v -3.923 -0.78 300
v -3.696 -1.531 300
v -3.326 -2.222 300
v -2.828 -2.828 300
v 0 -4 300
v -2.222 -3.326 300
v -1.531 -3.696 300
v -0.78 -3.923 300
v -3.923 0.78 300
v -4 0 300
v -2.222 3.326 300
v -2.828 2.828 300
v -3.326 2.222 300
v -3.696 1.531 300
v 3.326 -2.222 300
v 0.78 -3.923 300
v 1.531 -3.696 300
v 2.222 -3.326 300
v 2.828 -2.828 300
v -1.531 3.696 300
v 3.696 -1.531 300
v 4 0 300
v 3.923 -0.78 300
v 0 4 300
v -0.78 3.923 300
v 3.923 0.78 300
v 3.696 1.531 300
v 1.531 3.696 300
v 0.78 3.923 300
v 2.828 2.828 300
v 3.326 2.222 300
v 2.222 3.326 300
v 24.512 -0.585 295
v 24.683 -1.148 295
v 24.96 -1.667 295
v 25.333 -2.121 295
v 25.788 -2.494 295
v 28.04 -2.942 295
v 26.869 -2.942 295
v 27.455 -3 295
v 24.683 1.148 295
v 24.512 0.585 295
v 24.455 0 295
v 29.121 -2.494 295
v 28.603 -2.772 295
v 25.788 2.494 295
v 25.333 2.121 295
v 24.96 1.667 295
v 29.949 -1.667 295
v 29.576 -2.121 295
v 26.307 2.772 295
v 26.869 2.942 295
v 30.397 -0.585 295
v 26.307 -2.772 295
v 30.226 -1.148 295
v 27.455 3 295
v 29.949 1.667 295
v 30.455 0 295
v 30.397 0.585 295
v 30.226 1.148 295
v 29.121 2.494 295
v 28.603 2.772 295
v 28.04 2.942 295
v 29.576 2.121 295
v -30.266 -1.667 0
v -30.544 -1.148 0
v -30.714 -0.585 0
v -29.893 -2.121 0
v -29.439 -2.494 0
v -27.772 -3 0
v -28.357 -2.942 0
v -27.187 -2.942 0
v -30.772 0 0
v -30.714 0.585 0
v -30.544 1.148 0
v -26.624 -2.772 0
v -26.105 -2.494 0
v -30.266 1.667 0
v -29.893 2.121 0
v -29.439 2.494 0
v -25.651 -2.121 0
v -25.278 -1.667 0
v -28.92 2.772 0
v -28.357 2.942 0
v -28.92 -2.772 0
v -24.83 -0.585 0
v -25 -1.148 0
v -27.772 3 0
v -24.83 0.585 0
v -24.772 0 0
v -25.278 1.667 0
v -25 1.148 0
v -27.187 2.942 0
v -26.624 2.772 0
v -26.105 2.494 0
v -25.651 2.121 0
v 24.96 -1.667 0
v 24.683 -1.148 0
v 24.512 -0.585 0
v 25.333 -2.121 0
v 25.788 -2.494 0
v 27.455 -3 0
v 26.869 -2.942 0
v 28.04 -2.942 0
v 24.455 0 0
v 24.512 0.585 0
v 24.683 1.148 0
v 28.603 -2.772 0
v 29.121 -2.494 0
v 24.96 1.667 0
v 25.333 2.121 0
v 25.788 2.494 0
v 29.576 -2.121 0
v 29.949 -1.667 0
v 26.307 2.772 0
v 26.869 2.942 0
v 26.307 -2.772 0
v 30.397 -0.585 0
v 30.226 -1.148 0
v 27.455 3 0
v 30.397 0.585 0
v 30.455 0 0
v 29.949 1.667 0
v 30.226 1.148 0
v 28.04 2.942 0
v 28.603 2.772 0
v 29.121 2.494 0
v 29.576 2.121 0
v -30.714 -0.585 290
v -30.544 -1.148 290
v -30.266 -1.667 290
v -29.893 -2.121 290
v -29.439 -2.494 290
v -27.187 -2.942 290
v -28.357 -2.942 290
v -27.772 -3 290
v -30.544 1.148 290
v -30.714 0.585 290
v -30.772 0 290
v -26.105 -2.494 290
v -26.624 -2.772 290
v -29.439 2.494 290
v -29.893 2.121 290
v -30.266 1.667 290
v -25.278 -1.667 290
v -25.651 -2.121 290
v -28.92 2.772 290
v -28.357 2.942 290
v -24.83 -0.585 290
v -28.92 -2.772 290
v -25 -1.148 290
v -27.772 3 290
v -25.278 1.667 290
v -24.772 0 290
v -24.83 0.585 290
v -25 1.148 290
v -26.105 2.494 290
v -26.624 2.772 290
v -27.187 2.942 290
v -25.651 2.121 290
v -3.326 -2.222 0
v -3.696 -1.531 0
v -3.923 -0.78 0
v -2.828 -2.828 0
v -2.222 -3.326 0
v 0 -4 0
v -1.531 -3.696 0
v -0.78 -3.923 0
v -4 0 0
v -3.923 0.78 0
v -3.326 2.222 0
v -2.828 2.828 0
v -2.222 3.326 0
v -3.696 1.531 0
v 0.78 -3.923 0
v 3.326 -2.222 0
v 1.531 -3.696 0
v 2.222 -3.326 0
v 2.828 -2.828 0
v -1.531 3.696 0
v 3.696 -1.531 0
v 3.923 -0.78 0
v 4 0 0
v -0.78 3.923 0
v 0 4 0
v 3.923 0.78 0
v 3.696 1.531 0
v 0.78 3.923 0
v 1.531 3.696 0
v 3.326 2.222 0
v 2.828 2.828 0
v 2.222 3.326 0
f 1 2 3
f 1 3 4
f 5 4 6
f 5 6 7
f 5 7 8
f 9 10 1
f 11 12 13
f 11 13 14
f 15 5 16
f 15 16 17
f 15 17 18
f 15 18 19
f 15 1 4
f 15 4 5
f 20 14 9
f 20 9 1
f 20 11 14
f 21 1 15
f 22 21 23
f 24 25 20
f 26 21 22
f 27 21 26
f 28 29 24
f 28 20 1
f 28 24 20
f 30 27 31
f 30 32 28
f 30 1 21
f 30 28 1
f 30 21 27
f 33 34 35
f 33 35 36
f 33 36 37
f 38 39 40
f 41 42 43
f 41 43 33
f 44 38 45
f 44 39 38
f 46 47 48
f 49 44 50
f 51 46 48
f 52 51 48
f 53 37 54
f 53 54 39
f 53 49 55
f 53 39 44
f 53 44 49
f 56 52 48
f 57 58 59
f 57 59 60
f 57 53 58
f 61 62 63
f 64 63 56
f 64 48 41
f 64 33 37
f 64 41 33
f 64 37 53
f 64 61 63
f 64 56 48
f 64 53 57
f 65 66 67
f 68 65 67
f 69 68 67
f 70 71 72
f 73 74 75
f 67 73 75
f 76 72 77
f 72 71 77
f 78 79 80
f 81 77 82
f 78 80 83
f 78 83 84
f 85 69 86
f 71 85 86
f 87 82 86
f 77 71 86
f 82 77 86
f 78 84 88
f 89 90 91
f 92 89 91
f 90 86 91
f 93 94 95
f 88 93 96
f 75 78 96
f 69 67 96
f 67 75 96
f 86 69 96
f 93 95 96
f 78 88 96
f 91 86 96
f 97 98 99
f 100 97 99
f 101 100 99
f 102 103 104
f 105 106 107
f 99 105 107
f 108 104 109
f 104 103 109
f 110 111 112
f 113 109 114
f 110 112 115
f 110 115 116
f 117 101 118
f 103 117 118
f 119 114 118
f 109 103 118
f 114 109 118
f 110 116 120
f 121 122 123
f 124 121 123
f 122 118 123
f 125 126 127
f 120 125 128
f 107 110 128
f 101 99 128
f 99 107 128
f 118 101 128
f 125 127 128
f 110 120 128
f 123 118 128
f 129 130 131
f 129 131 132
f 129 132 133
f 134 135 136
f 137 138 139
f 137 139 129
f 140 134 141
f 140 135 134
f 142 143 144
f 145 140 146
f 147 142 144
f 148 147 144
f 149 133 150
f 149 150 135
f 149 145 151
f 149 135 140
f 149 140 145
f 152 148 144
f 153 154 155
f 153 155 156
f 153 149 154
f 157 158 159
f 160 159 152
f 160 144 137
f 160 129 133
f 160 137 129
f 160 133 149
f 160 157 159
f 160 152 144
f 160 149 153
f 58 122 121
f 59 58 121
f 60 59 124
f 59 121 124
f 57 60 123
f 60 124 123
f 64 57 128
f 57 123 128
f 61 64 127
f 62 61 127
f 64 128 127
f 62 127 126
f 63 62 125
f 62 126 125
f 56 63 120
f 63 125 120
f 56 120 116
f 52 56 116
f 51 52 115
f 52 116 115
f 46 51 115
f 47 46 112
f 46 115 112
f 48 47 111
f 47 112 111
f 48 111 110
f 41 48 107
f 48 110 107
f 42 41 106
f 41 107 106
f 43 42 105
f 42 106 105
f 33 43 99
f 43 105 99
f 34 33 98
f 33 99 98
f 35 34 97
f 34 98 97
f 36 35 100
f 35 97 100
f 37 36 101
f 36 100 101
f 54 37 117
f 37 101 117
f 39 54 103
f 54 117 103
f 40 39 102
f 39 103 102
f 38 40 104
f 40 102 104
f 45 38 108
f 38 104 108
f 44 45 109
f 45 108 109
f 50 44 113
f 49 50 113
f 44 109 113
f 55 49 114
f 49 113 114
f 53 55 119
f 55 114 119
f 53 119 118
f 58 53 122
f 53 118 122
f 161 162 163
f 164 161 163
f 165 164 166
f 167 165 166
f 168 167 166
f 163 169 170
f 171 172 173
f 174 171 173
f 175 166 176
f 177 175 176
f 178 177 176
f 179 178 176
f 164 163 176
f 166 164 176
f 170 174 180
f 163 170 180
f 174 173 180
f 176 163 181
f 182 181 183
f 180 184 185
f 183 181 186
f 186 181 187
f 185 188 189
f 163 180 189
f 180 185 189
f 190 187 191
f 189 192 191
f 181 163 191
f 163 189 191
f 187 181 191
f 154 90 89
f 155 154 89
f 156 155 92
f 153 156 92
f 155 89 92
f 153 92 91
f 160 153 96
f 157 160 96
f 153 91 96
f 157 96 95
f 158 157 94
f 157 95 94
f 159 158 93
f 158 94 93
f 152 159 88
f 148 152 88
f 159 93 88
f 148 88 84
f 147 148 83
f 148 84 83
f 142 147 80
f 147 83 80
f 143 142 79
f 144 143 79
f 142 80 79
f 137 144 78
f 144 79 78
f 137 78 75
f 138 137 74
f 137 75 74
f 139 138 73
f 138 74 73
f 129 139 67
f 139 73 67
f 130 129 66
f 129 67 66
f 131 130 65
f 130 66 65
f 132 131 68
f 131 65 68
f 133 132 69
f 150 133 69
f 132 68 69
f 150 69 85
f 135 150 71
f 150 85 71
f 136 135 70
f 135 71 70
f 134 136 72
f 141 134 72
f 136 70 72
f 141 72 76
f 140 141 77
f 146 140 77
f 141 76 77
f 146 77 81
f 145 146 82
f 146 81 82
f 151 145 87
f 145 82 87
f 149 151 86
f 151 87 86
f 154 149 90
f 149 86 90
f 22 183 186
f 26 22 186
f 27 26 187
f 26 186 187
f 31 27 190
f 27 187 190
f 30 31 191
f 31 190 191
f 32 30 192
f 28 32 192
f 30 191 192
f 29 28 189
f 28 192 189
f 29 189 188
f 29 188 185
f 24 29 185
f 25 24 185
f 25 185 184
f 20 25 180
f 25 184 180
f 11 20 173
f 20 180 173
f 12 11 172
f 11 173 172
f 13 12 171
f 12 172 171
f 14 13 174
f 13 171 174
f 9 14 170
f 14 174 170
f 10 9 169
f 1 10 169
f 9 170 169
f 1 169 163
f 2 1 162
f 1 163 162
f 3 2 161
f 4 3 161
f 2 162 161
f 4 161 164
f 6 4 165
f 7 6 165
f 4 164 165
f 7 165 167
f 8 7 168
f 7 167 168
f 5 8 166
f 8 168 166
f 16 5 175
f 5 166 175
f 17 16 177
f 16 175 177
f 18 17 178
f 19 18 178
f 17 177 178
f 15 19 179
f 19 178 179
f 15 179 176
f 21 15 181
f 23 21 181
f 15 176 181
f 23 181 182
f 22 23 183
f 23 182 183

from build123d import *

# Parameters (mm, degrees)
F0_R     = 4
F1_DEPTH = 300
F0_R_2   = 3
F2_DEPTH = 290
F3_DEPTH = 295


with BuildPart() as f1:
    # F0 (on Top) → F1 (new body)
    with BuildSketch(Plane.XY):
        Circle(F0_R)
    extrude(amount=F1_DEPTH)


with BuildPart() as f2:
    # F0 (on Top) → F2 (new body)
    with BuildSketch(Plane.XY):
        with Locations((-27.772063, 0)):
            Circle(F0_R_2)
    extrude(amount=F2_DEPTH)


with BuildPart() as f3:
    # F0 (on Top) → F3 (new body)
    with BuildSketch(Plane.XY):
        with Locations((27.454717, 0)):
            Circle(F0_R_2)
    extrude(amount=F3_DEPTH)


solid = Compound([f1.part, f2.part, f3.part])
